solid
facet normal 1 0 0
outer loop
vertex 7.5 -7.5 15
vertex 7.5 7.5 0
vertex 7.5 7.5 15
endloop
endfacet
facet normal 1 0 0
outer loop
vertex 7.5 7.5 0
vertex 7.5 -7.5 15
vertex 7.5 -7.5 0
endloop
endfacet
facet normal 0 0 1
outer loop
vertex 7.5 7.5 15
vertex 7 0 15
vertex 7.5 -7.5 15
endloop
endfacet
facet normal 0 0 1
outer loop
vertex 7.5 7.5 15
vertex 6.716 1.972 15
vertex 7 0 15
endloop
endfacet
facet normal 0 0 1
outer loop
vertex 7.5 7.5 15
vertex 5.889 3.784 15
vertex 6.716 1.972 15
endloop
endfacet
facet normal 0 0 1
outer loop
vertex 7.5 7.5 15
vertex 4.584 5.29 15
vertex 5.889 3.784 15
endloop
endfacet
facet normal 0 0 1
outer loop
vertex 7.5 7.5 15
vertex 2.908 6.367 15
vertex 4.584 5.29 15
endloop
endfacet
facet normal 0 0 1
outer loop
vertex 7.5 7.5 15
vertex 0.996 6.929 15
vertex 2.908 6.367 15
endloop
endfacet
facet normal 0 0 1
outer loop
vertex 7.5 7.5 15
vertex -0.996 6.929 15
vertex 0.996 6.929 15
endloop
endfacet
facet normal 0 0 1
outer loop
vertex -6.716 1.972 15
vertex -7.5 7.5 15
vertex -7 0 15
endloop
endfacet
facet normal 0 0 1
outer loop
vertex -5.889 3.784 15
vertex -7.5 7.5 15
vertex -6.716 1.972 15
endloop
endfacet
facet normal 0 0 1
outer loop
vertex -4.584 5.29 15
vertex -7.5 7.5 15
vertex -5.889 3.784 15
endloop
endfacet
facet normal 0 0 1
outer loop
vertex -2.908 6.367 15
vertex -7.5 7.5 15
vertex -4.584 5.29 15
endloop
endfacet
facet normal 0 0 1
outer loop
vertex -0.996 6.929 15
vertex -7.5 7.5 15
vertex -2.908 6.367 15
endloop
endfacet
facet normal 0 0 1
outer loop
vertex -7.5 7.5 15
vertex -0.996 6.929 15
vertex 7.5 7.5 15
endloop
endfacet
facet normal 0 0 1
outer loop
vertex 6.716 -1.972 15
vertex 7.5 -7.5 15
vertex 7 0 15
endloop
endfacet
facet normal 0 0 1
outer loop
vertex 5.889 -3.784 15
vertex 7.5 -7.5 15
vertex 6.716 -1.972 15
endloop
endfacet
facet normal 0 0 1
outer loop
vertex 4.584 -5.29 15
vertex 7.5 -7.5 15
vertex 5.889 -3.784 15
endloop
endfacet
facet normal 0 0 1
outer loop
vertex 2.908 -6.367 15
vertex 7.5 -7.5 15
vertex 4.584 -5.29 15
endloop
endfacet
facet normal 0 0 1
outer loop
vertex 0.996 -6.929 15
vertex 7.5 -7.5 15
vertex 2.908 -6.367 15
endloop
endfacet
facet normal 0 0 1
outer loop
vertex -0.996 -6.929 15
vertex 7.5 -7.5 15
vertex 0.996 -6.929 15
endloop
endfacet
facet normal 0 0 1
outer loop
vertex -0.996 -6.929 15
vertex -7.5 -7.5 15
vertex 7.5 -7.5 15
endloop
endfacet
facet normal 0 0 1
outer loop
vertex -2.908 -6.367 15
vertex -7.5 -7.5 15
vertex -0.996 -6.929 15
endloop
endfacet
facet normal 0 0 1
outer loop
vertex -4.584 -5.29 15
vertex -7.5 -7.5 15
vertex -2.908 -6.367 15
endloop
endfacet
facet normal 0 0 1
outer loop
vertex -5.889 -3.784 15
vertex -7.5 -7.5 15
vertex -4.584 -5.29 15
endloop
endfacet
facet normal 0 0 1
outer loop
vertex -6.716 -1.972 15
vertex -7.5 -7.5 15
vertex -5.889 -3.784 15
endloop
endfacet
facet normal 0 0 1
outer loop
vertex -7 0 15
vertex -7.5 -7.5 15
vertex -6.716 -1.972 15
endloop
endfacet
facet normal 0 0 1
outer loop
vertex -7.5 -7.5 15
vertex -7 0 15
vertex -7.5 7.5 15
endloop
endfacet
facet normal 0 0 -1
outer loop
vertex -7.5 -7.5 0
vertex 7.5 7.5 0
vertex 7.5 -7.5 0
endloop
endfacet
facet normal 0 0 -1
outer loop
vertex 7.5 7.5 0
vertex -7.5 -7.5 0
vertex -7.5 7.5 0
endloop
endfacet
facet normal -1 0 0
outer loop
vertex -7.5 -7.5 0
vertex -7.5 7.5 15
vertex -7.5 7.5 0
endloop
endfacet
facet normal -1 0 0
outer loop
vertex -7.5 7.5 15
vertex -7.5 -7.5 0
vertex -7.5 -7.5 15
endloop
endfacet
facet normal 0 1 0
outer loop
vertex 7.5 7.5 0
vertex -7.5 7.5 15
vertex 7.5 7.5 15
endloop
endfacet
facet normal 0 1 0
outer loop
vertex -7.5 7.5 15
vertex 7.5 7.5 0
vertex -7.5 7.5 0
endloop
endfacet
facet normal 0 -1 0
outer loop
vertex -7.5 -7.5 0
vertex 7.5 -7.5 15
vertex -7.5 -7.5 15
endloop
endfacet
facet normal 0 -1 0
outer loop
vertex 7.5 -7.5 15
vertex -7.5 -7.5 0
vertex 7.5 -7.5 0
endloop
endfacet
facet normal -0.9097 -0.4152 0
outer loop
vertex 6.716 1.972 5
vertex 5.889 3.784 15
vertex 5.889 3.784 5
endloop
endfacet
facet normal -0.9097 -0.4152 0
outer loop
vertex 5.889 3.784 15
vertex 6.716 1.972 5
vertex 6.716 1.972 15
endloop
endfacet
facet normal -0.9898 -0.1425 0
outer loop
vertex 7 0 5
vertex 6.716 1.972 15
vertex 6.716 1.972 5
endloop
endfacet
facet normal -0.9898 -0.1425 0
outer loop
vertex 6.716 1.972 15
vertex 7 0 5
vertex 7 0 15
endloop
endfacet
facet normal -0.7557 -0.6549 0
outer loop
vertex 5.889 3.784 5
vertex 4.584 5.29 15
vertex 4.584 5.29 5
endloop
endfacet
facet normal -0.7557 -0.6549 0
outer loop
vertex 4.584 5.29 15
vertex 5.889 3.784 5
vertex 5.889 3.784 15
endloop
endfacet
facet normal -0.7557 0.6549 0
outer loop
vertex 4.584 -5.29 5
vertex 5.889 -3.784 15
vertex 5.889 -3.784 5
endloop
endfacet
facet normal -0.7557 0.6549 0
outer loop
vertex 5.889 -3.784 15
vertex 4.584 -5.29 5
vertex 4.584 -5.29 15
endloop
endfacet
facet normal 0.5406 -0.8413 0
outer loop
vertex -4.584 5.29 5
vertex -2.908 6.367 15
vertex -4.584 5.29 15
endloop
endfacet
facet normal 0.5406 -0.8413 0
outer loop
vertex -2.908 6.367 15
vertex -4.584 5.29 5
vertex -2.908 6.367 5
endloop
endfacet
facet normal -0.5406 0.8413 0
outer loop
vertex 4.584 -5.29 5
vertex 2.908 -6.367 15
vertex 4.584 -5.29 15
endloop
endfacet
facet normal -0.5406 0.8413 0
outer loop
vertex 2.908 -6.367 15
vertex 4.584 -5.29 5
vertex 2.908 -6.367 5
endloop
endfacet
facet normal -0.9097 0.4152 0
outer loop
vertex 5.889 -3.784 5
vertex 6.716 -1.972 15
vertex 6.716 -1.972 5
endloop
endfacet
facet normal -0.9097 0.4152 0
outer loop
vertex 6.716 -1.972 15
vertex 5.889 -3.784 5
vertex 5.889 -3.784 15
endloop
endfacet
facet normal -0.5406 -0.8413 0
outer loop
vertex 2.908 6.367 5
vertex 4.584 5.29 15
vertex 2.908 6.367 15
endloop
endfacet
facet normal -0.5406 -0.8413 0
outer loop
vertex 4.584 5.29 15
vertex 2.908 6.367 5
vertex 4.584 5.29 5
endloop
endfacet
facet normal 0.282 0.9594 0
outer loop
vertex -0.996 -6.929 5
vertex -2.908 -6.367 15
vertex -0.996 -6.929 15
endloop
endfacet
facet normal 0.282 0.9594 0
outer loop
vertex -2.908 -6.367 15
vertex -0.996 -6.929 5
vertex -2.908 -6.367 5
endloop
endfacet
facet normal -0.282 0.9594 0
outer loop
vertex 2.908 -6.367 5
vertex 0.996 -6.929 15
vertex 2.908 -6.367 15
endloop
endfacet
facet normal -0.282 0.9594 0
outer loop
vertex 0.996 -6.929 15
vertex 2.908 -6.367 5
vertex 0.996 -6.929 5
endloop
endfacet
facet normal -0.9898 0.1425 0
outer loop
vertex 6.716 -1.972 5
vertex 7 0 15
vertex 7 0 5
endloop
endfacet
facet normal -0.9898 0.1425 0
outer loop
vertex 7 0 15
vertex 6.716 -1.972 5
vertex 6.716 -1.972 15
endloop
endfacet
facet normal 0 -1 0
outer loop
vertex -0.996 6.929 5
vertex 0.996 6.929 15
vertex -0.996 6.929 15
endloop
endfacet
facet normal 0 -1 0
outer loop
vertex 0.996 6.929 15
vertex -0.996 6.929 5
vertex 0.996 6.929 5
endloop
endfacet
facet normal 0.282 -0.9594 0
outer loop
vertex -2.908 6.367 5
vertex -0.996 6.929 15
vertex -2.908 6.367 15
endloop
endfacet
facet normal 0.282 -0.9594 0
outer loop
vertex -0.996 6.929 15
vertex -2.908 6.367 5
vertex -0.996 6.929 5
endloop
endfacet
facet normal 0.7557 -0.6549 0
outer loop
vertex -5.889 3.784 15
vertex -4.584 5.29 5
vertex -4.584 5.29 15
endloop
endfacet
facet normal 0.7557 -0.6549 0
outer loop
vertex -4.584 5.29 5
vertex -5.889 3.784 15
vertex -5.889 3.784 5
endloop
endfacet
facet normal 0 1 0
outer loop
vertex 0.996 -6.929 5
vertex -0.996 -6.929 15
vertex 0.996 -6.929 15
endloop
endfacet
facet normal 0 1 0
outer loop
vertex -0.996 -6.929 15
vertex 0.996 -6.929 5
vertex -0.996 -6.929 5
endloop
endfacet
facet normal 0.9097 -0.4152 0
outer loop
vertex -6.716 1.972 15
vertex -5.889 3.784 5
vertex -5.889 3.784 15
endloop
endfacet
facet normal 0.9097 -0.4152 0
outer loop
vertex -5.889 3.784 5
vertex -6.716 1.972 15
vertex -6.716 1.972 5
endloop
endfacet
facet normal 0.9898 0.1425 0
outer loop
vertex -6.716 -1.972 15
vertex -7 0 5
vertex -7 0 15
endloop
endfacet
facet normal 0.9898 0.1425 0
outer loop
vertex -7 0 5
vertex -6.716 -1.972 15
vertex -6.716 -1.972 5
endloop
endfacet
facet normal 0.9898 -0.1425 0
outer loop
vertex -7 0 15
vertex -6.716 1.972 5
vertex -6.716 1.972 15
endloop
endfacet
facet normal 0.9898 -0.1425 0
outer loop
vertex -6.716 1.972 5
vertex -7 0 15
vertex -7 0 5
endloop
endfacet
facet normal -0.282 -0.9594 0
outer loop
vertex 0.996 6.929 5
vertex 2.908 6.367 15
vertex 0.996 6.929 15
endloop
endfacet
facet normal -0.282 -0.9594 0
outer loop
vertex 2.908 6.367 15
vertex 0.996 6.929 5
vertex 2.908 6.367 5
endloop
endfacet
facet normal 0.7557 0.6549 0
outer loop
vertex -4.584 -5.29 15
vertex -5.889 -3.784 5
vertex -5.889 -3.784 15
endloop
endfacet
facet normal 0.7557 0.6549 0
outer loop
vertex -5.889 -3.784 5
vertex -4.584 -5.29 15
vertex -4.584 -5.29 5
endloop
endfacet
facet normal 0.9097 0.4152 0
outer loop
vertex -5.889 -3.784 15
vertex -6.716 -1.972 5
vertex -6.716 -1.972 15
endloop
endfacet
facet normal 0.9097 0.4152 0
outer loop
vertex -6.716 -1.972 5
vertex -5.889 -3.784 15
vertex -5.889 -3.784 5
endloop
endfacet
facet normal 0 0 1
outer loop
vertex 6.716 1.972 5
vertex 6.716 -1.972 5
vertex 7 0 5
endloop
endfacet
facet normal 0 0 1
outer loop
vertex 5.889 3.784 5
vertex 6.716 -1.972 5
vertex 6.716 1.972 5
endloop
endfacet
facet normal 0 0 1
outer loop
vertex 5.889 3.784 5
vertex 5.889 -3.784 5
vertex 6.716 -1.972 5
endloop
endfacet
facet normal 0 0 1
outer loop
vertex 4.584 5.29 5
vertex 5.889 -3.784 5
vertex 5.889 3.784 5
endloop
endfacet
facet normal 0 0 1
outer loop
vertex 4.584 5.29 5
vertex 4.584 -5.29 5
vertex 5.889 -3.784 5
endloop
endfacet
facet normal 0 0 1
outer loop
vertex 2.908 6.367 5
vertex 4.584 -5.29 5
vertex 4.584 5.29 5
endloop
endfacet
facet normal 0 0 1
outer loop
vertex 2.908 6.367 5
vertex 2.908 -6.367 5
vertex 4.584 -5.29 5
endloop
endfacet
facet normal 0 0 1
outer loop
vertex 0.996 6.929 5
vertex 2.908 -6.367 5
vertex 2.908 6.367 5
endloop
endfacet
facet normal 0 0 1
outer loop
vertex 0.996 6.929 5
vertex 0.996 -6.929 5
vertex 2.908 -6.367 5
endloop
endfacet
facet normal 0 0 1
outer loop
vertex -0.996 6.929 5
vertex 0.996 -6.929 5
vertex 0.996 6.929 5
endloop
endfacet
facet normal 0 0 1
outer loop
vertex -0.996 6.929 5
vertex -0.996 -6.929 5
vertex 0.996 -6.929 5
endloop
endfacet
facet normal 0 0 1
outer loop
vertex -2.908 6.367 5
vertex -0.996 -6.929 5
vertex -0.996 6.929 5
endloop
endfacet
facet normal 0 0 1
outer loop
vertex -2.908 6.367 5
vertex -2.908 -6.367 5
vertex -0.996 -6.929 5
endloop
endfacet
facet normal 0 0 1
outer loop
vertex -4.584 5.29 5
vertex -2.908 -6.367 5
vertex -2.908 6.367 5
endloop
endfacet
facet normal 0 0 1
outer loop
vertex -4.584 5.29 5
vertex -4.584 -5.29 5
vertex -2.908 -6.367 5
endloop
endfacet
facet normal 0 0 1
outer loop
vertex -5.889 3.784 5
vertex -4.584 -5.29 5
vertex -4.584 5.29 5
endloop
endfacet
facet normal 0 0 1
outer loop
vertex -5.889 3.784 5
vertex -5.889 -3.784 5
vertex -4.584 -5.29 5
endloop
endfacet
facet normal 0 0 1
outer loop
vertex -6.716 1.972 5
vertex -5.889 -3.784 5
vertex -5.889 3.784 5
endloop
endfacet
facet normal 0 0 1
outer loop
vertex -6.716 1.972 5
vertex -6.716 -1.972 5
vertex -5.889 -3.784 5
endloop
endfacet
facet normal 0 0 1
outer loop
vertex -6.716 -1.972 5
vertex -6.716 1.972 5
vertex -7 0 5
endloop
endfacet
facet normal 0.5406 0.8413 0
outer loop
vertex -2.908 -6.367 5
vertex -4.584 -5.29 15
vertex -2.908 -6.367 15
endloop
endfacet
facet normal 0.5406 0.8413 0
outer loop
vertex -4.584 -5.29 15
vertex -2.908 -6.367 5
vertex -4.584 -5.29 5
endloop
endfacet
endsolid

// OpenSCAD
SINGLE_CUBE_WIDTH = 15;

module HoledCube() {
    step_width = SINGLE_CUBE_WIDTH;
    step_depth = SINGLE_CUBE_WIDTH;
    step_height = SINGLE_CUBE_WIDTH;

    difference() {
        translate([0,0, step_height/2]){
            cube([step_width, step_depth, step_height], center = true);
        }
        translate([0, 0, 5]) {
            cylinder(step_height*2, 7, 7);
        }
    }
}

 HoledCube();

// single row 
/*
cubes_per_row = 5;
for(i=[0: cubes_per_row]) {
    translate([i*SINGLE_CUBE_WIDTH,0,0]){
        HoledCube();
    }   
}*/
